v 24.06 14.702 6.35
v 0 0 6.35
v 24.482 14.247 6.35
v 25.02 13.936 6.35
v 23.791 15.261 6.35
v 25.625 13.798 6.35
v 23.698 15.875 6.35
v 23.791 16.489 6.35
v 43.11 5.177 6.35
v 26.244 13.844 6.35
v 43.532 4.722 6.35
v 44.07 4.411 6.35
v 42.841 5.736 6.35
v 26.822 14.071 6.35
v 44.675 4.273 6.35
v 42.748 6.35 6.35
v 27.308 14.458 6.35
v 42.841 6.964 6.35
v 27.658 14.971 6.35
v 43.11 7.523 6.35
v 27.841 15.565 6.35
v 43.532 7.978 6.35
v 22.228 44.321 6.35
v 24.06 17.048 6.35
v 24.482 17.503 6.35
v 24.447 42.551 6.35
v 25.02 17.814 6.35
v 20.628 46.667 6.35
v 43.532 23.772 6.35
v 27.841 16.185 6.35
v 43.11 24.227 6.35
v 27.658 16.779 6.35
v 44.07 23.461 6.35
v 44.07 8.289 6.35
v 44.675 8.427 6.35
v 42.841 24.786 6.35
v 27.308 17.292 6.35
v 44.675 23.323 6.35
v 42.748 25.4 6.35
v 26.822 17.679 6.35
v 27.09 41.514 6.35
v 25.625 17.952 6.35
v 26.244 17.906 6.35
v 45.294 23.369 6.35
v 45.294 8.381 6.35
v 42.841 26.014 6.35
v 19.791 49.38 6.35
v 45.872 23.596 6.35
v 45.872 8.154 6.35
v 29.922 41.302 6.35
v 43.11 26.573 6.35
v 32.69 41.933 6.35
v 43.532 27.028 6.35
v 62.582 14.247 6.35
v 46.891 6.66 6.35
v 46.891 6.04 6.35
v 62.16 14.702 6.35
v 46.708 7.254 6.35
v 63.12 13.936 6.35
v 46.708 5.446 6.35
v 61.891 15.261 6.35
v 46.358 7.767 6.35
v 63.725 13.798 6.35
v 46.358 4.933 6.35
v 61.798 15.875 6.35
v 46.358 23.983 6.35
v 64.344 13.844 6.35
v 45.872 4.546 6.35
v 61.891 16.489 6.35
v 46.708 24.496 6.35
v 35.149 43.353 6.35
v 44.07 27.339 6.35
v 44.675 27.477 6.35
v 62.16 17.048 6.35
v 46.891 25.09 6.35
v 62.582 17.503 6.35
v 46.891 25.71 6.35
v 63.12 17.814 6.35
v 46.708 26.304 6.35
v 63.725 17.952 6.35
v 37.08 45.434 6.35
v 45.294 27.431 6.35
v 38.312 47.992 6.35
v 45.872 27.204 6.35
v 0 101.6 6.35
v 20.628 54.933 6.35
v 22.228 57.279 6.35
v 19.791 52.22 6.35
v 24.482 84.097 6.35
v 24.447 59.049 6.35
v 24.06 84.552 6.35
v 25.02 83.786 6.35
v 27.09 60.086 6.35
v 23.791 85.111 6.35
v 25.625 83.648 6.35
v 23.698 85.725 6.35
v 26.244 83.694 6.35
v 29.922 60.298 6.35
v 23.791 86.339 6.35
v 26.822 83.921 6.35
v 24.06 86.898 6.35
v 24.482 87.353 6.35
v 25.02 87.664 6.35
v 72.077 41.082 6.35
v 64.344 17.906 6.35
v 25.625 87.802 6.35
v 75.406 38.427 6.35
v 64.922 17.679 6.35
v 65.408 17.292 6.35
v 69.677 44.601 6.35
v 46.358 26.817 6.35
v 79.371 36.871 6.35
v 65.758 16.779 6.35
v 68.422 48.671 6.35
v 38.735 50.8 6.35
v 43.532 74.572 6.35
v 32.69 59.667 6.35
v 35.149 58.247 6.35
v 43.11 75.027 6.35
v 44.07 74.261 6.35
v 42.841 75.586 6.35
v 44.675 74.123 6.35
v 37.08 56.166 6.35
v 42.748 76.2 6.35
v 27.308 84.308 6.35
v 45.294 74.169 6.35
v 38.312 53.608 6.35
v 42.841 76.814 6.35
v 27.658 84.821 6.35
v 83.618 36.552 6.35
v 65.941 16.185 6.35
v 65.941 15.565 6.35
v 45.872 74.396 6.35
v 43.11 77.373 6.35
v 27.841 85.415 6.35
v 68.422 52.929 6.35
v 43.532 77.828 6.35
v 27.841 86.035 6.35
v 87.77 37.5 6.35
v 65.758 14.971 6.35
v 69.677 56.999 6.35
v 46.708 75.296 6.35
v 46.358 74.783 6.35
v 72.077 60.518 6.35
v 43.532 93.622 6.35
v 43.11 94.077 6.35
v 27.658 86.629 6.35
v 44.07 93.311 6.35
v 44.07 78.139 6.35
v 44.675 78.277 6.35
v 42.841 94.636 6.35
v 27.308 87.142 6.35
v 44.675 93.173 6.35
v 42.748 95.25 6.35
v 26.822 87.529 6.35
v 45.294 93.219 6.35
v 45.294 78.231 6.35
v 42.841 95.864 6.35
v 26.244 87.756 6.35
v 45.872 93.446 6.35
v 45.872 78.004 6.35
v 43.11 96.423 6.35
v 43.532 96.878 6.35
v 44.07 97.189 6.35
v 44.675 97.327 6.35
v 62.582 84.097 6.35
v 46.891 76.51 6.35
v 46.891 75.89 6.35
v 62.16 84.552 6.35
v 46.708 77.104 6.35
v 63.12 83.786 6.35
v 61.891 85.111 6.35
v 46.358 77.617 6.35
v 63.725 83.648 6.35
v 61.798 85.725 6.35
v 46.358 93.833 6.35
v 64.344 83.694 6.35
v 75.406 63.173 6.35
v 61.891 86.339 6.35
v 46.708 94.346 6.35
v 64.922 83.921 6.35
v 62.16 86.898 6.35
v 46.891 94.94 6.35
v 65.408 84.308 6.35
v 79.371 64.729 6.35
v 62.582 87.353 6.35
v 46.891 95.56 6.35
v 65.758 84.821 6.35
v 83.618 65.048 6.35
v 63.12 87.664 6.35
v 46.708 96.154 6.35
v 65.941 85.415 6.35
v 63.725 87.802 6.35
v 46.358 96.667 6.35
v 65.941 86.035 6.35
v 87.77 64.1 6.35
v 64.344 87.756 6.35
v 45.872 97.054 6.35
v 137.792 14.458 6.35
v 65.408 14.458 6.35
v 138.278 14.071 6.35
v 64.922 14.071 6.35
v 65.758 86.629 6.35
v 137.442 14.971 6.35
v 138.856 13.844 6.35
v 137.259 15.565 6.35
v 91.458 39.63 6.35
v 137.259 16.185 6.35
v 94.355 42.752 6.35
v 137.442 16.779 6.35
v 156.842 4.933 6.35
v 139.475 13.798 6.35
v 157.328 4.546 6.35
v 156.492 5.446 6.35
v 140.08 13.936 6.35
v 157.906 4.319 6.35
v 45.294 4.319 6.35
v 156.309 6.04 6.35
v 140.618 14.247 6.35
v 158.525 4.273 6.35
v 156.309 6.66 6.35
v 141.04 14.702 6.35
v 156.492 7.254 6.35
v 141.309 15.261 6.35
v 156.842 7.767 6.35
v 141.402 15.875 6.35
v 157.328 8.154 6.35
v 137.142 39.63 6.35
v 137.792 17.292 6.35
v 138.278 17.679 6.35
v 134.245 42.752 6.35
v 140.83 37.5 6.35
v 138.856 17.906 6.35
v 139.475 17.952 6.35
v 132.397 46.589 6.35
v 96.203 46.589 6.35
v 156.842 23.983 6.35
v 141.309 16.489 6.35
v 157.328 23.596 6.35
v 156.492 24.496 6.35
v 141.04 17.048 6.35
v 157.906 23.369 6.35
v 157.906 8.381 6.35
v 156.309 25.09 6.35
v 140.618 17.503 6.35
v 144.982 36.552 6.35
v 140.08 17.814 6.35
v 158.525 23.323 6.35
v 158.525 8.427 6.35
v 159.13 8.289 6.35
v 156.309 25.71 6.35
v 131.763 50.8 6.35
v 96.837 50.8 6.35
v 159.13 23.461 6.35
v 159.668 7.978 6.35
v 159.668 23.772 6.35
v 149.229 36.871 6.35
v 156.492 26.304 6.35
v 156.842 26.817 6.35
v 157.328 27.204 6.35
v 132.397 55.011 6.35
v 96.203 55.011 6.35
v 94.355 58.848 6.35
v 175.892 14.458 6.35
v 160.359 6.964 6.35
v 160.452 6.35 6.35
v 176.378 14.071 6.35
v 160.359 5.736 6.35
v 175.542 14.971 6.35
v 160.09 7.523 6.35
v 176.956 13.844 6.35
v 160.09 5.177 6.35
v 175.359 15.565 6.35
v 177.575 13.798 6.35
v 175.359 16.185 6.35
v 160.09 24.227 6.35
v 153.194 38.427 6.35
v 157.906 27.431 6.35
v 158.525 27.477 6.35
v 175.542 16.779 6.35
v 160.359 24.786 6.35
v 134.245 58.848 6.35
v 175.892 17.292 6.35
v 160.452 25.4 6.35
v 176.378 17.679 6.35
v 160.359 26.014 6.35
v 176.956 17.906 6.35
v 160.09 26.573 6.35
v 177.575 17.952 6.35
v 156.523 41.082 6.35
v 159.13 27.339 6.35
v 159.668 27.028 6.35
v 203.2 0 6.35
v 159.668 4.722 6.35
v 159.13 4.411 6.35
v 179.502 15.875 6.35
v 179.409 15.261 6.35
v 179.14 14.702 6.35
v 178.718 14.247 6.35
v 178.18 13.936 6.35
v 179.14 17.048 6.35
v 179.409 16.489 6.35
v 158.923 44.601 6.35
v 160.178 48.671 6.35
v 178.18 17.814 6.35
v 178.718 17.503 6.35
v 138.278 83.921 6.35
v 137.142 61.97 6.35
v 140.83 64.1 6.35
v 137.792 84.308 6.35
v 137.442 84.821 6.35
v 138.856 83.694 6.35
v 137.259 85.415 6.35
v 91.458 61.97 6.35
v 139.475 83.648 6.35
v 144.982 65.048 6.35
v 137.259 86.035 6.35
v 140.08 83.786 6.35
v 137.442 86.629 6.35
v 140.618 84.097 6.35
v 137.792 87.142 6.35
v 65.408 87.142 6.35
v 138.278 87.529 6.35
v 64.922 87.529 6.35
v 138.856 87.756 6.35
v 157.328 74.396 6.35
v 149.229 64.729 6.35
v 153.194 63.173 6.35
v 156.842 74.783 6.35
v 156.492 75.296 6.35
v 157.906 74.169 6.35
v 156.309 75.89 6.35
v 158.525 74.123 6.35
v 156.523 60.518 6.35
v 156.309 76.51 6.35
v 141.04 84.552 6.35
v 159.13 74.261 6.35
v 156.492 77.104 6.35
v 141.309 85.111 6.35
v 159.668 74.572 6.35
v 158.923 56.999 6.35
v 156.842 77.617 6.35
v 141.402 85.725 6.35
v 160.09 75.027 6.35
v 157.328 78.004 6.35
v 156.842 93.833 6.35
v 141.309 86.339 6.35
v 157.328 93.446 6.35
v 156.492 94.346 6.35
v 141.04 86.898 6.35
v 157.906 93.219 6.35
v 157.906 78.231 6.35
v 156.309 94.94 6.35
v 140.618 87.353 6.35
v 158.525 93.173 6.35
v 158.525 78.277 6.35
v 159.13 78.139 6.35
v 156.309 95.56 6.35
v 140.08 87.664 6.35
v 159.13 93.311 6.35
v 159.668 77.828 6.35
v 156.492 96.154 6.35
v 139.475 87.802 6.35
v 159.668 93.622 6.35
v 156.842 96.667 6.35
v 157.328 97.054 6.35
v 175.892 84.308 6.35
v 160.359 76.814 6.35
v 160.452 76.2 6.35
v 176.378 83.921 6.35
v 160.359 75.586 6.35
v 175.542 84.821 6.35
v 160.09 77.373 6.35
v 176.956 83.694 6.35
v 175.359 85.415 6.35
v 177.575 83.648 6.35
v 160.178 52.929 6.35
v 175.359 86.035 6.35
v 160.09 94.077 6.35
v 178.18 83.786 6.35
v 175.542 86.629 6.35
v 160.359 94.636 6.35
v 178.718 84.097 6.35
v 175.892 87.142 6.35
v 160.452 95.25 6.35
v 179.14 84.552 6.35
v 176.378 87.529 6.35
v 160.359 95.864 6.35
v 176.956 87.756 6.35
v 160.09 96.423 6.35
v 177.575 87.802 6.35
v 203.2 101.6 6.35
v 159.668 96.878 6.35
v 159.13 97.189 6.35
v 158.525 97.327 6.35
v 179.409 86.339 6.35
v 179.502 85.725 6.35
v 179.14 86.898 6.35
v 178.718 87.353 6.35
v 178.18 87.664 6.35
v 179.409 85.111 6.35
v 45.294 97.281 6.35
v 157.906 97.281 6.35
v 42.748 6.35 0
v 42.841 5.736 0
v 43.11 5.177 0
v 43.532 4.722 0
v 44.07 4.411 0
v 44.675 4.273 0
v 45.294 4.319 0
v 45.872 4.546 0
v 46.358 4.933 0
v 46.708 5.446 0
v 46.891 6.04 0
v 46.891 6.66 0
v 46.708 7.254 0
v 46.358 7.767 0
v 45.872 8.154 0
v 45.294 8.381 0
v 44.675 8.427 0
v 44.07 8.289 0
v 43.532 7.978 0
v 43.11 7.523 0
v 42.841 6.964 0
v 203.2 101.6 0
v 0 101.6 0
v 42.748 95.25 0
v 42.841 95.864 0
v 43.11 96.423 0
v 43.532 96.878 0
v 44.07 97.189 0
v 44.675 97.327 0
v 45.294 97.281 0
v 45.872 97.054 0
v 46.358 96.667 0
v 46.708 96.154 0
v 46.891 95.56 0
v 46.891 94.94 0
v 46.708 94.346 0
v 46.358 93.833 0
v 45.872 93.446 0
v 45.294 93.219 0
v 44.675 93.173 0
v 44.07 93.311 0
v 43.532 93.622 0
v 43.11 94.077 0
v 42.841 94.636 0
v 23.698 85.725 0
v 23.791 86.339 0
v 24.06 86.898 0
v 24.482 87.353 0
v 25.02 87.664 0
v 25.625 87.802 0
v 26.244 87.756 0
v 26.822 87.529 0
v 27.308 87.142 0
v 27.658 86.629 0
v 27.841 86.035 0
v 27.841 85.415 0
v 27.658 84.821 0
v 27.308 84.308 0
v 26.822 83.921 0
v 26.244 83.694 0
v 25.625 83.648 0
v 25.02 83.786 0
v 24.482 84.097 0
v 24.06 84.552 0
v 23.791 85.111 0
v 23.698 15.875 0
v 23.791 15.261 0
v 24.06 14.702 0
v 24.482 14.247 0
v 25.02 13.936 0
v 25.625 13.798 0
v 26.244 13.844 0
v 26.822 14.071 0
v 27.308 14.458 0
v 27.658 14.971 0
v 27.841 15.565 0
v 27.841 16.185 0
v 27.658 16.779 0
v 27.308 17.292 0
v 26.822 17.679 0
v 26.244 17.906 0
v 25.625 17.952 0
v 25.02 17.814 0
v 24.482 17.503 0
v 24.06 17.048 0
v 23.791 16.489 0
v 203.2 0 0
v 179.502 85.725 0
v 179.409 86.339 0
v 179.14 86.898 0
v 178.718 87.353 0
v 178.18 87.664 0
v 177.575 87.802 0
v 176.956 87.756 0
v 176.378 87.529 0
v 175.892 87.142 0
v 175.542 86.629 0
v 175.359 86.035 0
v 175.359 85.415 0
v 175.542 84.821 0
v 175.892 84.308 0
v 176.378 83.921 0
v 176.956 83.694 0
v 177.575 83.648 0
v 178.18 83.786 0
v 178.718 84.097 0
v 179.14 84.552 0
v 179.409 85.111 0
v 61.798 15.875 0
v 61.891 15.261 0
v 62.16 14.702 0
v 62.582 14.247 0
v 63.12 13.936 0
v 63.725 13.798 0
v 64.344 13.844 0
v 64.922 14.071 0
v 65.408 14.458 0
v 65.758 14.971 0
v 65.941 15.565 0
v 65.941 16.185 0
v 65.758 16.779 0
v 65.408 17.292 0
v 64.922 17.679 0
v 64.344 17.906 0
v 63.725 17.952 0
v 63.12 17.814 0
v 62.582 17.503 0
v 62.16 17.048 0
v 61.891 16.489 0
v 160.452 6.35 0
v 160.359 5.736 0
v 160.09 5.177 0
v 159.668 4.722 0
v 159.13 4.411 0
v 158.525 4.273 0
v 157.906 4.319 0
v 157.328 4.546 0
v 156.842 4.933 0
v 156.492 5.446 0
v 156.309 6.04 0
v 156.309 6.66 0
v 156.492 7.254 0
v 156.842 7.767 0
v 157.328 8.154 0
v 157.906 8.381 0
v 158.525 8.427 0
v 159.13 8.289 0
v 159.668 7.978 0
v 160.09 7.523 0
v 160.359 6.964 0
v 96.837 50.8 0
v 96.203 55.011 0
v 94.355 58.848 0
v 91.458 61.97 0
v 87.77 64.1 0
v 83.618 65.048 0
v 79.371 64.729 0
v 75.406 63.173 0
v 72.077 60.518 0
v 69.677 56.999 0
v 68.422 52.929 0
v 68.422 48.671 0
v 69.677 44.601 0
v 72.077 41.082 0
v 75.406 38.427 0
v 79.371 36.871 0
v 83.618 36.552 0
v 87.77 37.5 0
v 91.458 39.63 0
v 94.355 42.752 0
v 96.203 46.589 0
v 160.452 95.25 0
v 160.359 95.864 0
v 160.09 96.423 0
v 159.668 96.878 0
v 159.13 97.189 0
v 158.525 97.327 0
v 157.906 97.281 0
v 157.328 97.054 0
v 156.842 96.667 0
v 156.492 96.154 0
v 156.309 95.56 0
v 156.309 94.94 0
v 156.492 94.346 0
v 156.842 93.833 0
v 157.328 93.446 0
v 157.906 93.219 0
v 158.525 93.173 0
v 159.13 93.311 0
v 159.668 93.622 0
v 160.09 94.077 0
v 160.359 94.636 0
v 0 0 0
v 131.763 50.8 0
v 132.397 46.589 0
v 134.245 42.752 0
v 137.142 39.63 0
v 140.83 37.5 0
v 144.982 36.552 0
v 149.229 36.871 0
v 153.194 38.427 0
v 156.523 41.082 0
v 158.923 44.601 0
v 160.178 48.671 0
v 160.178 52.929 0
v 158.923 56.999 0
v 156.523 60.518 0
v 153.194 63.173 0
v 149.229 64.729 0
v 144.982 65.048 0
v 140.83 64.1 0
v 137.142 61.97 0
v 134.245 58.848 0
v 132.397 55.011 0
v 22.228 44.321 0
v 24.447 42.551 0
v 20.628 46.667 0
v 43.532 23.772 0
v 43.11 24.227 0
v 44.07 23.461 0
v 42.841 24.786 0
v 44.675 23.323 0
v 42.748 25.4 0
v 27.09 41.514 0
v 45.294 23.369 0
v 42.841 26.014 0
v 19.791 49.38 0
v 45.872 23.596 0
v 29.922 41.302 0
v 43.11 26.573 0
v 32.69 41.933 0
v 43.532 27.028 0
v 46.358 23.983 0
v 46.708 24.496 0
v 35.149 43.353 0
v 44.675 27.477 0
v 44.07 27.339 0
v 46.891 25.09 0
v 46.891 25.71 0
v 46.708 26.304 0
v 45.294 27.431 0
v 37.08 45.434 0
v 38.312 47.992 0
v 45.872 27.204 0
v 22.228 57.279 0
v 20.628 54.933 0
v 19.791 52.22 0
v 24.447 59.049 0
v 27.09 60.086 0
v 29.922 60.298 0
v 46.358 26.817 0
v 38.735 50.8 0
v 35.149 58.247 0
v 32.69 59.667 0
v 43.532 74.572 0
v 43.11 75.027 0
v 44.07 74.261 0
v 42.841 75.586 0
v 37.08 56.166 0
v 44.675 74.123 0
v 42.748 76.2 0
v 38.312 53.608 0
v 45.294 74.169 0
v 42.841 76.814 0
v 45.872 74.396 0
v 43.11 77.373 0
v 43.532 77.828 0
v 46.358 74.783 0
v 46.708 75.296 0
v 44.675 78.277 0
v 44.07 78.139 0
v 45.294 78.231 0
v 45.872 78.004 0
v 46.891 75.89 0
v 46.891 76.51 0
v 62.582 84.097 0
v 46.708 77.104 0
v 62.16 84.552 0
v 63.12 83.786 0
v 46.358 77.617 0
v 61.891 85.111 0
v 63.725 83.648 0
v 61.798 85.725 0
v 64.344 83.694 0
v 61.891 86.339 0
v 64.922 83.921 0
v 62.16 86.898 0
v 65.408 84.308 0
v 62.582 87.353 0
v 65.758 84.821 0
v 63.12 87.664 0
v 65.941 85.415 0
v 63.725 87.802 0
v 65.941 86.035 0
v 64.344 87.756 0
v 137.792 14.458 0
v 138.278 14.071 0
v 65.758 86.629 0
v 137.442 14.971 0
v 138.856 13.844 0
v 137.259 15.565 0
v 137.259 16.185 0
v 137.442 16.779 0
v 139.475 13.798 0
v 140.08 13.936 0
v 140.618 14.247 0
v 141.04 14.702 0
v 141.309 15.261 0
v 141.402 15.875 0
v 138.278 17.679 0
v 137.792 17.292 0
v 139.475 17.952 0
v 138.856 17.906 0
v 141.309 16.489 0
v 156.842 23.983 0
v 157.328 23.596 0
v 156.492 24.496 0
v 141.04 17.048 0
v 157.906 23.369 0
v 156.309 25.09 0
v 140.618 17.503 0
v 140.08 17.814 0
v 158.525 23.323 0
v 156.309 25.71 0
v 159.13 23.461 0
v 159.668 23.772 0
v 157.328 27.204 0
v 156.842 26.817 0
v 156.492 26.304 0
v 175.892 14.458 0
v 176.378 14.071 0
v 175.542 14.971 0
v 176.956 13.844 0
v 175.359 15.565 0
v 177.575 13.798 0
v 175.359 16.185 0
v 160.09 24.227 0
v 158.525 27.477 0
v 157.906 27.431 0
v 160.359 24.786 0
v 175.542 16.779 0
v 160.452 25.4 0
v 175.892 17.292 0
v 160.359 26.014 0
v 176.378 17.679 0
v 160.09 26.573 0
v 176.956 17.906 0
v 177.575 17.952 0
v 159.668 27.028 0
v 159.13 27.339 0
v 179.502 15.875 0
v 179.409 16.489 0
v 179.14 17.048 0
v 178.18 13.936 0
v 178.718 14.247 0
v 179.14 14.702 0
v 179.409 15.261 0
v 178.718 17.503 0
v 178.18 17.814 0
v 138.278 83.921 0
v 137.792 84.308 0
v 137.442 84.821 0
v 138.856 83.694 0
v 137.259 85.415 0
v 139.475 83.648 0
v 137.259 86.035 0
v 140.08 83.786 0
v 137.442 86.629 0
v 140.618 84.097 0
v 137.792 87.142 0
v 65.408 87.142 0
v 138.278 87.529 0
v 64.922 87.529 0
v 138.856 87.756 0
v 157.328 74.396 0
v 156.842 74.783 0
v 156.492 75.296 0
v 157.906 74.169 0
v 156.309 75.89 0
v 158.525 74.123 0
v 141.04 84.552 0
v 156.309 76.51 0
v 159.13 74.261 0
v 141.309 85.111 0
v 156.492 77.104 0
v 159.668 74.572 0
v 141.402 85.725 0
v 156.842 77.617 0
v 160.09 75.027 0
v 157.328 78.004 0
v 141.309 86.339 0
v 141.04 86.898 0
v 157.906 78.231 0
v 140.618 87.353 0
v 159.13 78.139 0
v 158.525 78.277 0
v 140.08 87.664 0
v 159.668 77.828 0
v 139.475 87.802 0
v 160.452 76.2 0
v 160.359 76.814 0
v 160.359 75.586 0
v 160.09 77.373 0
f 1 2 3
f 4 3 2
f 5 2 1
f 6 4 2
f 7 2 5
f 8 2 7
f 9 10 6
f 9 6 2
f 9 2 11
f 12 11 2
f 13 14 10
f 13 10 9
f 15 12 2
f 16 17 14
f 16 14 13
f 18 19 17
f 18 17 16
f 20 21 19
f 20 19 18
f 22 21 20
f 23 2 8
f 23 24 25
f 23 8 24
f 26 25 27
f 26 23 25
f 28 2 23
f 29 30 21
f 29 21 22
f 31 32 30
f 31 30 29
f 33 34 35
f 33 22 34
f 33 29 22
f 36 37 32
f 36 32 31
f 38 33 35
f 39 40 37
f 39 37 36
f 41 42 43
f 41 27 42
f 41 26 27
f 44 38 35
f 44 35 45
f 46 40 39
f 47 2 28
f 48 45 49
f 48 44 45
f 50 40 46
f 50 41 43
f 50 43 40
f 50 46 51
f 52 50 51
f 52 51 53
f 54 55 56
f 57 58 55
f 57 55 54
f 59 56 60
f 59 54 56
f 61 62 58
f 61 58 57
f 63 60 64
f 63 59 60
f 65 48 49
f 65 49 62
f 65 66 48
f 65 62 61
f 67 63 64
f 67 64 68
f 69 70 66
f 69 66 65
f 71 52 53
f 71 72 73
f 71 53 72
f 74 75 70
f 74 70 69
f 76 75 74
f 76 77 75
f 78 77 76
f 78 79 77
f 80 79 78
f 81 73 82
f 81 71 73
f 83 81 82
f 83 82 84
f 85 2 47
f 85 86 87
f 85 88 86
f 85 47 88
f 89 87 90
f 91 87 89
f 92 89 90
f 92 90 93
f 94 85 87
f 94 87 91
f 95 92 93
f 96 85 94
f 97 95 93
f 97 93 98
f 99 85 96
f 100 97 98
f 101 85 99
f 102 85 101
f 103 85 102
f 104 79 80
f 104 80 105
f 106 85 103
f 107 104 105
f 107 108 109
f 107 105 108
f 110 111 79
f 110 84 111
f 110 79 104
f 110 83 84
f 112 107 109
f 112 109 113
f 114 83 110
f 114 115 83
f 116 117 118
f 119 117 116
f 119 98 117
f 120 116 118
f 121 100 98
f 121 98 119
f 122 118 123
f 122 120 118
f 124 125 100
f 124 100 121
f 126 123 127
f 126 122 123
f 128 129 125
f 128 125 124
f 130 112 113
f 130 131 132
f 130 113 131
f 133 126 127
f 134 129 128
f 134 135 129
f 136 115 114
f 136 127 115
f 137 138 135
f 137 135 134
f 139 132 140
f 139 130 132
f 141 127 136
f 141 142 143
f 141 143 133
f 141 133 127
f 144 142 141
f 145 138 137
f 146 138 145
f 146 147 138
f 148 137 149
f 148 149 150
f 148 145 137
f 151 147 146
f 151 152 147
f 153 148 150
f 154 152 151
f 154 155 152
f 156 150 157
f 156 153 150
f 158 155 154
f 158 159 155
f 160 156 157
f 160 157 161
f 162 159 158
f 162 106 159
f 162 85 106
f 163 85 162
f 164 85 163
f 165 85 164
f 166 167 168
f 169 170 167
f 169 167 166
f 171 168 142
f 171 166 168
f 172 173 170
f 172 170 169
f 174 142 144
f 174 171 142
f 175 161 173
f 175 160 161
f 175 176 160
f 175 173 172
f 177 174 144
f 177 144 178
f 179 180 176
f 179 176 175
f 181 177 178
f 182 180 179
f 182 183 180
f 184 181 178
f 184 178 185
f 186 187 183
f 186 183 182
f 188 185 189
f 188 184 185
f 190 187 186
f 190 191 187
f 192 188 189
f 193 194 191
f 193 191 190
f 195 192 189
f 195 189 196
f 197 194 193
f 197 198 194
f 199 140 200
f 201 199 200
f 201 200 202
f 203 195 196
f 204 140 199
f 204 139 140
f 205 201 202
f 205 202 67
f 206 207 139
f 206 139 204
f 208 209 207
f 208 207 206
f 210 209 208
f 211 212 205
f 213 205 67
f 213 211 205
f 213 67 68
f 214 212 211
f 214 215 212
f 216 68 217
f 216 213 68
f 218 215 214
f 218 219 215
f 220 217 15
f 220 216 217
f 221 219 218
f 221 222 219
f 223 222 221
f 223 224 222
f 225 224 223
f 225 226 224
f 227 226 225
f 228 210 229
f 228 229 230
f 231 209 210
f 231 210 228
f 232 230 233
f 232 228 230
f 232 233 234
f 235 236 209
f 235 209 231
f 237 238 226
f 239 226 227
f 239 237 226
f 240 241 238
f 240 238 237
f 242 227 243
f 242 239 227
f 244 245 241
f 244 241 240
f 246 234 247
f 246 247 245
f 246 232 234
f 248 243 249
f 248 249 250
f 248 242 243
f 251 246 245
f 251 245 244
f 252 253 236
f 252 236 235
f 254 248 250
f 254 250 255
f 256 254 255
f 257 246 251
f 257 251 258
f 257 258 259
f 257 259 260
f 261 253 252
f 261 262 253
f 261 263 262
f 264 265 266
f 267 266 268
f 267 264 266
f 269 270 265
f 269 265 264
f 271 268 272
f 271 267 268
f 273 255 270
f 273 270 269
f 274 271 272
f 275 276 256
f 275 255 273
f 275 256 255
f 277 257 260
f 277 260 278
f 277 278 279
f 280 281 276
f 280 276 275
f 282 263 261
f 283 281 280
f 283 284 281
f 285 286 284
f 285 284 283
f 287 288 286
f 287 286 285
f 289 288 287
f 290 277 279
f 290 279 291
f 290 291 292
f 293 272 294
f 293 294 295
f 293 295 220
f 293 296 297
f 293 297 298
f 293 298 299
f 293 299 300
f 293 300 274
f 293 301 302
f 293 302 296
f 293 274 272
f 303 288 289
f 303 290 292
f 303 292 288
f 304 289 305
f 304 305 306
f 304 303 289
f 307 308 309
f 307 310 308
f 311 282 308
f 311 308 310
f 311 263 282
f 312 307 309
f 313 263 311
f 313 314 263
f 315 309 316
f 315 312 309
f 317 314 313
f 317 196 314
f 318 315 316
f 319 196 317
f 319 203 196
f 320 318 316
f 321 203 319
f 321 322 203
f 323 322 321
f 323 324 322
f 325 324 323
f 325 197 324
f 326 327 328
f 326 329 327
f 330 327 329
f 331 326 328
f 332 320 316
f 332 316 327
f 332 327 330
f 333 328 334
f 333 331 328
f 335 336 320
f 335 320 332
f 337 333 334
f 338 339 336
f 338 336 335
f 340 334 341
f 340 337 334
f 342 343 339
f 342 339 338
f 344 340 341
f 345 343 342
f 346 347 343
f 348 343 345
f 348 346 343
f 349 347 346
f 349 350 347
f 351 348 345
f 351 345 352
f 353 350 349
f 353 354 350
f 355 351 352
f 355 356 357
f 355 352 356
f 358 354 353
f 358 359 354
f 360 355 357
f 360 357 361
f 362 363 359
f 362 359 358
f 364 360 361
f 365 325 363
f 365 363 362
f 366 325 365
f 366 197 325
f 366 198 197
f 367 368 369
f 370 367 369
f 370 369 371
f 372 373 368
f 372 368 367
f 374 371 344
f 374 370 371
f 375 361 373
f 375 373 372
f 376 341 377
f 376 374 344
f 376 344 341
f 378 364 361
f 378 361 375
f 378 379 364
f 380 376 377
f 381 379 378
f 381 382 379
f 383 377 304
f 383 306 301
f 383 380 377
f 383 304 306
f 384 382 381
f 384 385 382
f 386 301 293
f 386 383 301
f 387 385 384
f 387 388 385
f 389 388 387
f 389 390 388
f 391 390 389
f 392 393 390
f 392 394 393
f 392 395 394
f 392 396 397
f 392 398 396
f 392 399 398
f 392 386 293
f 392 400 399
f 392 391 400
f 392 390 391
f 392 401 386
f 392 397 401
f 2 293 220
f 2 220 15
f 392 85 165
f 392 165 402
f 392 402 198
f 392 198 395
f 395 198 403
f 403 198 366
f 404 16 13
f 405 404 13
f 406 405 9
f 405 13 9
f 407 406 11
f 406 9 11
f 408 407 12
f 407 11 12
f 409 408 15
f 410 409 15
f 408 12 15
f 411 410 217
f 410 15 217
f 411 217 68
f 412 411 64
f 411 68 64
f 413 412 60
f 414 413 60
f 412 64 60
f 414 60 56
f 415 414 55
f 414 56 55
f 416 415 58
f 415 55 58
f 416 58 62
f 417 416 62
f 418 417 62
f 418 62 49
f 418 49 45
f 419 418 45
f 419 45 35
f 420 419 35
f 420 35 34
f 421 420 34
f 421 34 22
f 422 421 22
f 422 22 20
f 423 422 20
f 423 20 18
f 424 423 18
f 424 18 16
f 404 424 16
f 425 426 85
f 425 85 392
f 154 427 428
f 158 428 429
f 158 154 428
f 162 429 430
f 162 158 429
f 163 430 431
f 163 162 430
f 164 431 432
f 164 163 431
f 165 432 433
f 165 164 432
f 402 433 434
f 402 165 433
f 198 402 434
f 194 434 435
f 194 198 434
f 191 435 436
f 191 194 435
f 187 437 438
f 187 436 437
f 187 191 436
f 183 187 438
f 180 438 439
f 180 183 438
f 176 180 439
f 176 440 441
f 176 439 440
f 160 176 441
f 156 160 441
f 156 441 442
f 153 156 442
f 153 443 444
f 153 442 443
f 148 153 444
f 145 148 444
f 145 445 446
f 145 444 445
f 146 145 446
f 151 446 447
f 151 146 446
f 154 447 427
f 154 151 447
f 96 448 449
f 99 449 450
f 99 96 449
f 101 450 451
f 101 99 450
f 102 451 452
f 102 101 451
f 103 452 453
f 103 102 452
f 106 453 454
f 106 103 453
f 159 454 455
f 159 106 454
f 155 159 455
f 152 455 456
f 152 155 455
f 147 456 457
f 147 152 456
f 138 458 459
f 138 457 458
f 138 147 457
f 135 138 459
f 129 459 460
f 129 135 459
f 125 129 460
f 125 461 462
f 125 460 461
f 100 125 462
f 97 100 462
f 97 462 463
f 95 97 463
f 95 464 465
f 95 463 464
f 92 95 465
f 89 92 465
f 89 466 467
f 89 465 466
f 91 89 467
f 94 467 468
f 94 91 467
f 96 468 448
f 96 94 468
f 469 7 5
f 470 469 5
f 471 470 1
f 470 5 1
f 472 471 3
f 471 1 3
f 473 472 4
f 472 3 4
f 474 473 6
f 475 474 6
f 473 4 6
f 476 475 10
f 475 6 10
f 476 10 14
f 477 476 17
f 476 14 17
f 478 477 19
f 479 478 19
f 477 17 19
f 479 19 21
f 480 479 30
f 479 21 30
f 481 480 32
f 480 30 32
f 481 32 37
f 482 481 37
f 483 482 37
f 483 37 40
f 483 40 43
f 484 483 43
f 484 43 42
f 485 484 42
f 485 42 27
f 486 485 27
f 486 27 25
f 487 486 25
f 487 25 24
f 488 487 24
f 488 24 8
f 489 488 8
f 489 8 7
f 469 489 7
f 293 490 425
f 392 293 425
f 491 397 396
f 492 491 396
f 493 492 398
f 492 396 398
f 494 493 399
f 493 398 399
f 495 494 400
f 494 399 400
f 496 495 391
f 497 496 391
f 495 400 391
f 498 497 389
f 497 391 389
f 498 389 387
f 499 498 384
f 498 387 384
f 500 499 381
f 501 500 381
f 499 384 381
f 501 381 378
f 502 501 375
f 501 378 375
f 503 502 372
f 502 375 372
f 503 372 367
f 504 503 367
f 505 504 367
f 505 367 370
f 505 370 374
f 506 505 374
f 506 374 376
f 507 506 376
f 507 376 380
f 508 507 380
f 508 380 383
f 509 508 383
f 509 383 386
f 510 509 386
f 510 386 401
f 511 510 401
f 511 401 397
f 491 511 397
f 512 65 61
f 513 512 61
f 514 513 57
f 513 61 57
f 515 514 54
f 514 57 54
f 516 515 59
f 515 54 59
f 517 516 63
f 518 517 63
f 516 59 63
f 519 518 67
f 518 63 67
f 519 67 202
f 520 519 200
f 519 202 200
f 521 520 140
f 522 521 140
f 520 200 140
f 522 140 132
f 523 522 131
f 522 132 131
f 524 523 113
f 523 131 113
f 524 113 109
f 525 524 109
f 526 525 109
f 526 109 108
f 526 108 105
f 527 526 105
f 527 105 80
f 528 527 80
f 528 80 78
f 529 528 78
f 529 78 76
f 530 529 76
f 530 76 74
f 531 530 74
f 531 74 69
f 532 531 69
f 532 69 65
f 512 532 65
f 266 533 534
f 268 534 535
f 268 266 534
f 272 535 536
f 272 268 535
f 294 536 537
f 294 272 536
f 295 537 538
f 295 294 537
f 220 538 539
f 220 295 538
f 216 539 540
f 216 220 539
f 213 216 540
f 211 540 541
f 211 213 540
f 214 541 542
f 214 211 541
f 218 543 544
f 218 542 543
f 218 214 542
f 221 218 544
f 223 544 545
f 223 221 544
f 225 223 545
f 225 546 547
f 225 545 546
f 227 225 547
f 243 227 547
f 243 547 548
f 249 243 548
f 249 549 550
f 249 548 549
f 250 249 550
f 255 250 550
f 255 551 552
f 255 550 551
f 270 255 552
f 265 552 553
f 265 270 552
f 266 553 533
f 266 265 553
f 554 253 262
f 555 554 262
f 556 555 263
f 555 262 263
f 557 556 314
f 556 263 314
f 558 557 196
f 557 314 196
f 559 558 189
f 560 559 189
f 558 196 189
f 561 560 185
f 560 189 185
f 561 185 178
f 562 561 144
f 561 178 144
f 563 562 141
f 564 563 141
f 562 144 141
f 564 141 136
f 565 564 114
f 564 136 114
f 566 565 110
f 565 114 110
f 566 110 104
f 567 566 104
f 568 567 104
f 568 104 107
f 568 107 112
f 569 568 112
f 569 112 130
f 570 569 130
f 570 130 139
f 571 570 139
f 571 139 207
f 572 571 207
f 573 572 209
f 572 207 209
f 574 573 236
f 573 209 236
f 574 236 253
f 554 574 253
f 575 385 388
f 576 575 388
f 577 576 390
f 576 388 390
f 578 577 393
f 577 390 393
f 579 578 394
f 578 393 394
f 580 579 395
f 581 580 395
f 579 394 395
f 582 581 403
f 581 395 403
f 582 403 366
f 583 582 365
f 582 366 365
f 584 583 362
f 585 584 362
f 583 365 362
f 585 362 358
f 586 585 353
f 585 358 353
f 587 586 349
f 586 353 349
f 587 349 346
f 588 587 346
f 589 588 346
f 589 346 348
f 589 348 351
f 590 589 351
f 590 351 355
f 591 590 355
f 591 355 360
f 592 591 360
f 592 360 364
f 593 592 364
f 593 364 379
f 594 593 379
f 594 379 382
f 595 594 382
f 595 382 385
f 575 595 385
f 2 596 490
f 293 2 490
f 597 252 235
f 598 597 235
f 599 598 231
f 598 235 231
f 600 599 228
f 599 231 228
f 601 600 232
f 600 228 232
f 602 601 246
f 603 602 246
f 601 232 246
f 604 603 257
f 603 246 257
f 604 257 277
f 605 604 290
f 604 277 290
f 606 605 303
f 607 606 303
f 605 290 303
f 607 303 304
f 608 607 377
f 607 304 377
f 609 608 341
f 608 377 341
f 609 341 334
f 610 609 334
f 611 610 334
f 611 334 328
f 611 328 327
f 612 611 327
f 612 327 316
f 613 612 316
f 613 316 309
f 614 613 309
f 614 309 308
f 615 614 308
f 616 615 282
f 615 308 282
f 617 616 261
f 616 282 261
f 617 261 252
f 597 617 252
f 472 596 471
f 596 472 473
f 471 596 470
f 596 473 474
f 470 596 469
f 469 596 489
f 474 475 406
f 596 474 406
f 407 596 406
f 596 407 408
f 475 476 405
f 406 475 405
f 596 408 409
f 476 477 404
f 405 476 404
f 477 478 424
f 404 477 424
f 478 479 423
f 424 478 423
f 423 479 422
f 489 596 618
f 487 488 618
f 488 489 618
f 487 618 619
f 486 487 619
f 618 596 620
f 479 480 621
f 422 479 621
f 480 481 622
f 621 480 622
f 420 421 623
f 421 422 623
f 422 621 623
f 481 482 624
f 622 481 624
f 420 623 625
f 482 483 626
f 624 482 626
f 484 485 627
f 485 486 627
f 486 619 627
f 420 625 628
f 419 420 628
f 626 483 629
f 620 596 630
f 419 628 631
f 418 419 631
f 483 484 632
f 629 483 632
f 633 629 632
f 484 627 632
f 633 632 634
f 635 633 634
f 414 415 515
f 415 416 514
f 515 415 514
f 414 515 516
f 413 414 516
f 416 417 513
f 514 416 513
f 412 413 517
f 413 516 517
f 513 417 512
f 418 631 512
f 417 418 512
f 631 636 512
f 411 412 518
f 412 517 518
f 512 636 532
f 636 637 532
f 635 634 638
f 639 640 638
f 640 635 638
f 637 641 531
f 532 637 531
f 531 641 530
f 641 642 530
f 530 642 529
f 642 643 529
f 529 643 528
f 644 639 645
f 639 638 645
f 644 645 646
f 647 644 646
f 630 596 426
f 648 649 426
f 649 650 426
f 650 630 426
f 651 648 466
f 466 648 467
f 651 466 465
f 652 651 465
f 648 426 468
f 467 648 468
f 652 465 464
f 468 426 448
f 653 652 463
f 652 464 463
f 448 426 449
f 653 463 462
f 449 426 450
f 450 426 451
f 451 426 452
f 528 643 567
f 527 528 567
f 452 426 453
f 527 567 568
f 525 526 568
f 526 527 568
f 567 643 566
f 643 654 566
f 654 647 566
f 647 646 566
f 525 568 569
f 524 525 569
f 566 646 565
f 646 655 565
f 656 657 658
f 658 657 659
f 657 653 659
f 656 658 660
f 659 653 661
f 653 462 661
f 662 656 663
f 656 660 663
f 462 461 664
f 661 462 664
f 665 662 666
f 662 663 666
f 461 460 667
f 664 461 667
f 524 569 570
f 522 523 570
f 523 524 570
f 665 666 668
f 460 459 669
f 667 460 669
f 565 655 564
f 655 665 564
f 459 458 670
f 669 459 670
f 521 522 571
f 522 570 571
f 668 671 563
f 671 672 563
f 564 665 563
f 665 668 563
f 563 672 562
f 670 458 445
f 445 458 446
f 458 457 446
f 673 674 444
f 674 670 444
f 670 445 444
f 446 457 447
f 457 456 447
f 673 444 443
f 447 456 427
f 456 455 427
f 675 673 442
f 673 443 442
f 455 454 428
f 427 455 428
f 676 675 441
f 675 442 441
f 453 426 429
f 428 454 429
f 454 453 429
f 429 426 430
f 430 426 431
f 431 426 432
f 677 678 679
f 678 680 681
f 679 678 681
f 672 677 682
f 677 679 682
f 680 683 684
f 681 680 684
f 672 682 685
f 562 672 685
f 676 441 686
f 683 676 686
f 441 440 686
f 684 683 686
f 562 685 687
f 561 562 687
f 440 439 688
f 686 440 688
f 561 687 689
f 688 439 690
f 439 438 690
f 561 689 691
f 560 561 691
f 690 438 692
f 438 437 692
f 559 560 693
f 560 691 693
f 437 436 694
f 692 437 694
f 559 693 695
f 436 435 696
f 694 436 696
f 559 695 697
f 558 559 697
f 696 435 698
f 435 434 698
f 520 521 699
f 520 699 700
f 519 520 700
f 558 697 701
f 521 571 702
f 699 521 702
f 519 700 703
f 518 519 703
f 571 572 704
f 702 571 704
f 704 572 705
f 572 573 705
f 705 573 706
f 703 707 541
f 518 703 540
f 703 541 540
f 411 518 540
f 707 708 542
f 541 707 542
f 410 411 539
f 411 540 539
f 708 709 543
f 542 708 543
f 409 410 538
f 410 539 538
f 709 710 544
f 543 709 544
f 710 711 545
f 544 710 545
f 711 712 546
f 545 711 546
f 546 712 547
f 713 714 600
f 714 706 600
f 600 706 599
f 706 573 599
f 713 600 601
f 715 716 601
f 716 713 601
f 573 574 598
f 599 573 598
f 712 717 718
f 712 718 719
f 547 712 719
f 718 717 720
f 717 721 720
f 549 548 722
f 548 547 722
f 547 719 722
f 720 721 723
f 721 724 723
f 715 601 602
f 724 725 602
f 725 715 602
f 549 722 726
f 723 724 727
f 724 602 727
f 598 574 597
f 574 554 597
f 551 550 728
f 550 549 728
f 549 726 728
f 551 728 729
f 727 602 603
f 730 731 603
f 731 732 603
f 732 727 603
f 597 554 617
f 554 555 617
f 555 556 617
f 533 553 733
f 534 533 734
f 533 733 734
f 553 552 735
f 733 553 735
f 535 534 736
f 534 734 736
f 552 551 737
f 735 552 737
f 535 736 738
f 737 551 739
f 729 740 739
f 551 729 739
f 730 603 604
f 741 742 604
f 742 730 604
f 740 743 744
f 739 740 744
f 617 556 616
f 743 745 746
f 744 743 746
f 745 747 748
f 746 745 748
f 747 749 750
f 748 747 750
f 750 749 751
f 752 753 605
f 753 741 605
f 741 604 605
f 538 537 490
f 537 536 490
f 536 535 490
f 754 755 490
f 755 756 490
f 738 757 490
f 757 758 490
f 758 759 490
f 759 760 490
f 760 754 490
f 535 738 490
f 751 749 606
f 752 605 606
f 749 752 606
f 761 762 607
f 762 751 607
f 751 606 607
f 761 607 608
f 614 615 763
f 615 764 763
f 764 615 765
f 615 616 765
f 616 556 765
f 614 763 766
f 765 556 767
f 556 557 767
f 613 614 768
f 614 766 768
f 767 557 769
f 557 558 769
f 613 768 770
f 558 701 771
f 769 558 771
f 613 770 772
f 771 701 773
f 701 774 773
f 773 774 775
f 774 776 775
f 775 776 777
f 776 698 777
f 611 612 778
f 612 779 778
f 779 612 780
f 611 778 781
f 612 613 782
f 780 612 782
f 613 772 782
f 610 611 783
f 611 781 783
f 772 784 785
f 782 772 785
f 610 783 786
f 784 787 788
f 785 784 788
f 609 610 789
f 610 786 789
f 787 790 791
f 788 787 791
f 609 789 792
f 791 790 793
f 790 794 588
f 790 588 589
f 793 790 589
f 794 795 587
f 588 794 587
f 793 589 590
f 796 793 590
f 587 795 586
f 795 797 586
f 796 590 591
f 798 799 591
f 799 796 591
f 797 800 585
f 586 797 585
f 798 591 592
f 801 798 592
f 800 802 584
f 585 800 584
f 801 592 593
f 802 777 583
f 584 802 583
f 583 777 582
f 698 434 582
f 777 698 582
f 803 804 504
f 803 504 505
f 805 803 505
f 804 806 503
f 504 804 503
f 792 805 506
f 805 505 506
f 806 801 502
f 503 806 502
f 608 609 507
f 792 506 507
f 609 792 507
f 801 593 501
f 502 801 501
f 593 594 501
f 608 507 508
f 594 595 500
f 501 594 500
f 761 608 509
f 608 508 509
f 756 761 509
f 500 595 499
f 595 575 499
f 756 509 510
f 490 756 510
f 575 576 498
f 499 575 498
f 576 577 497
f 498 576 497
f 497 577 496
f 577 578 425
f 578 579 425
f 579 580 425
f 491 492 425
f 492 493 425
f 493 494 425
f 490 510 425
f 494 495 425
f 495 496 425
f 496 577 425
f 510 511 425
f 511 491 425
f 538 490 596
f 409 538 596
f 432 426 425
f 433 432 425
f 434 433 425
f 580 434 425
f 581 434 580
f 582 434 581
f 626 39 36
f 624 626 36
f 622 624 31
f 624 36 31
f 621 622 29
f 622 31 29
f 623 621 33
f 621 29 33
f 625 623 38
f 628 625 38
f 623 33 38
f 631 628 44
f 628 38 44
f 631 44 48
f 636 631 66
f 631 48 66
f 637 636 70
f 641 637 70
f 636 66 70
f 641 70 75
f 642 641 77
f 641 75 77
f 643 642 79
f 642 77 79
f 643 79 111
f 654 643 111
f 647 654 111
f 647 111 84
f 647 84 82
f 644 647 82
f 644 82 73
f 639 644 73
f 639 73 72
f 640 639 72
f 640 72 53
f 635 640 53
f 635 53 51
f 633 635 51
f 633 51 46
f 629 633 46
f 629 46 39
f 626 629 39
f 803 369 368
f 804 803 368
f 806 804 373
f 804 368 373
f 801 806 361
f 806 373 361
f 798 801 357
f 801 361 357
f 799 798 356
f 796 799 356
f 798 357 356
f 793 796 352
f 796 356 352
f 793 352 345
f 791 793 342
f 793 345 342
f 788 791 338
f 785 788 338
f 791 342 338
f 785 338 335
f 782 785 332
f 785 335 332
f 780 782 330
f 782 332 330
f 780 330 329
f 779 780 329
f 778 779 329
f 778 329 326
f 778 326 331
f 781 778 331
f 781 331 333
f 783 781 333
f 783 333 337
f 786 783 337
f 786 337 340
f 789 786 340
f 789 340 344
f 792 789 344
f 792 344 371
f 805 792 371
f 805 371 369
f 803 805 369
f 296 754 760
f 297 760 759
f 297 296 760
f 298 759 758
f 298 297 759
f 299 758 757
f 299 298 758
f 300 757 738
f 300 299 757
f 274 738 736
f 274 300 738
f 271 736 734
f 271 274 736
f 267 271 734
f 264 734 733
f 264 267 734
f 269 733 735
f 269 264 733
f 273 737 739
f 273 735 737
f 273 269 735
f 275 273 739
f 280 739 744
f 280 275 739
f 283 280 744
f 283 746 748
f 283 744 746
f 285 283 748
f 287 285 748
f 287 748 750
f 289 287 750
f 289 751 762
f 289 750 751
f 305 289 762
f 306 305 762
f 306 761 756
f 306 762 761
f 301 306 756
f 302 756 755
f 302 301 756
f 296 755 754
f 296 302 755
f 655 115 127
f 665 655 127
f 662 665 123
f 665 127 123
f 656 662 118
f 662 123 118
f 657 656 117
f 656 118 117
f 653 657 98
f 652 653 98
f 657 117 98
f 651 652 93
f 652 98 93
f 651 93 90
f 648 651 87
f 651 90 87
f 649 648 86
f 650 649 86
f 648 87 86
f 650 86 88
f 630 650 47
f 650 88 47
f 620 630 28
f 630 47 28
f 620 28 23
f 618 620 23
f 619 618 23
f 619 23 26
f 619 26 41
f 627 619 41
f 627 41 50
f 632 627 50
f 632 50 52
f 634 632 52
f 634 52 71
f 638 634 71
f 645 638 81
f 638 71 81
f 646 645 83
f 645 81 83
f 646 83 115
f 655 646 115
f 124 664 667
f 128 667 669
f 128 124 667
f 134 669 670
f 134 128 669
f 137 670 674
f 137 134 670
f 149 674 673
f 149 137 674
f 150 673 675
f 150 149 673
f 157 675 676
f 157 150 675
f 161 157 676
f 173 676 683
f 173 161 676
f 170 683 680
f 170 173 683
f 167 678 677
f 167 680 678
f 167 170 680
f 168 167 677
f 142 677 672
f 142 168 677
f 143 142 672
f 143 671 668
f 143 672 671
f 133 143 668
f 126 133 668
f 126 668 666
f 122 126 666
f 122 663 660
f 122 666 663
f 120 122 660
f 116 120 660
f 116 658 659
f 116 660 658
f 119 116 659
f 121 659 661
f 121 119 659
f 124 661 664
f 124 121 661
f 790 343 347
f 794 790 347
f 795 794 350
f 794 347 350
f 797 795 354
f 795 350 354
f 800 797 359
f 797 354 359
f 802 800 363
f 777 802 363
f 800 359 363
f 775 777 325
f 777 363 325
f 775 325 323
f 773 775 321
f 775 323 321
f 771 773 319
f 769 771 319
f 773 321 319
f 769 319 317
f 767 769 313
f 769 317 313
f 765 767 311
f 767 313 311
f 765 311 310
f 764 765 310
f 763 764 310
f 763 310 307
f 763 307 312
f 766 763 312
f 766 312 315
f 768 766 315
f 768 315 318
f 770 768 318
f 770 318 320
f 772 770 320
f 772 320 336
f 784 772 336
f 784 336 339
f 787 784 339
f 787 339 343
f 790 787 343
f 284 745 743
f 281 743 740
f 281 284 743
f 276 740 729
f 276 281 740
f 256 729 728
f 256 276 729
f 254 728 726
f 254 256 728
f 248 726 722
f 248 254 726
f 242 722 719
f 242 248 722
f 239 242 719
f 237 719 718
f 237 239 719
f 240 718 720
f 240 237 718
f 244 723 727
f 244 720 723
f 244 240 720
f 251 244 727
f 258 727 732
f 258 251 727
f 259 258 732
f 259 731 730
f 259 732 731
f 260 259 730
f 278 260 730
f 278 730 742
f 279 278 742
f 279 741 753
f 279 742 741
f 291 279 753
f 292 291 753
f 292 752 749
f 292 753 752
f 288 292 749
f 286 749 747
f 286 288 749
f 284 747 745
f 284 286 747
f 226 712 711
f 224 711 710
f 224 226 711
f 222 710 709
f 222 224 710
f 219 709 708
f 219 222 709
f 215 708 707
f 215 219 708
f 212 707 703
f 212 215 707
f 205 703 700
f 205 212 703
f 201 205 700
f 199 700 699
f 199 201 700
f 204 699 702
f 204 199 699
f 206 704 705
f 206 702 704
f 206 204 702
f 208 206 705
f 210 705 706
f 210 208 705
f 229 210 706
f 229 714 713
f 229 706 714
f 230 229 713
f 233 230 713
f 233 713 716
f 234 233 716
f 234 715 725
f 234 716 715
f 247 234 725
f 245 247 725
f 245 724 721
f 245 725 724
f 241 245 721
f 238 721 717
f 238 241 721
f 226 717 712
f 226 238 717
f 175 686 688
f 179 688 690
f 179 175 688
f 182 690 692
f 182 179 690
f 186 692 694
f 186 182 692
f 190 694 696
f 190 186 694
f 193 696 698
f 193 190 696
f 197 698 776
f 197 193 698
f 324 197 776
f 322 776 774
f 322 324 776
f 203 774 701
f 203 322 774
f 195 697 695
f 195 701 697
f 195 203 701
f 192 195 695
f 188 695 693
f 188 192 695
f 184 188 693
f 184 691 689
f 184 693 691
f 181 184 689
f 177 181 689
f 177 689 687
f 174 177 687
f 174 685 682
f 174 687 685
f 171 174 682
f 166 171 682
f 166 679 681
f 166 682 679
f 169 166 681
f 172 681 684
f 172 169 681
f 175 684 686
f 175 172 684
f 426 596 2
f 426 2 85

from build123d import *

# Parameters (mm, degrees)
SKETCH1_W               = 203.2
SKETCH1_H               = 101.6
BOSS_EXTRUDE1_DEPTH     = 6.35
SKETCH3_R               = 14.2875
SKETCH3_R_2             = 9.525
CUT_EXTRUDE2_DEPTH      = 6.35
SKETCH5_R               = 2.0828
CUT_EXTRUDE3_DEPTH      = 228.273233136
MIRROR2_COPY_1_SKETCH_R = 2.0828
MIRROR2_COPY_1_DEPTH    = 228.273233136


with BuildPart() as part:
    # Sketch1 → Boss-Extrude1 (new body)
    with BuildSketch(Plane.XY):
        with Locations((101.6, 50.8)):
            Rectangle(SKETCH1_W, SKETCH1_H)
    extrude(amount=BOSS_EXTRUDE1_DEPTH)

    # Sketch3 → Cut-Extrude2 (cut)
    with BuildSketch(Plane.XY.offset(6.35)):
        with Locations((82.55, 50.8)):
            Circle(SKETCH3_R)
        with Locations(Location((146.05, 50.8, 0), (0, 0, 180))):
            Circle(SKETCH3_R)
        with Locations((29.21, 50.8)):
            Circle(SKETCH3_R_2)
    extrude(amount=-CUT_EXTRUDE2_DEPTH, mode=Mode.SUBTRACT)

    # Sketch5 → Cut-Extrude3 (cut, through all)
    with BuildSketch(Plane.XY.offset(6.35)):
        with Locations((139.319, 85.725)):
            Circle(SKETCH5_R)
        with Locations((158.369, 95.25)):
            Circle(SKETCH5_R)
        with Locations((158.369, 76.2)):
            Circle(SKETCH5_R)
        with Locations((177.419, 85.725)):
            Circle(SKETCH5_R)
    cut_extrude3 = extrude(amount=-CUT_EXTRUDE3_DEPTH, mode=Mode.SUBTRACT)

    # Mirror1: Cut-Extrude3 across plane
    add(cut_extrude3.mirror(Plane.ZX.offset(50.8)), mode=Mode.SUBTRACT)

    # Mirror2: Cut-Extrude3 across plane
    add(cut_extrude3.mirror(Plane(origin=(101.6, 0, 0), x_dir=(0, 0, 1), z_dir=(1, 0, 0))), mode=Mode.SUBTRACT)

    # Mirror2 copy 1 sketch → Mirror2 copy 1 (cut, through all)
    with BuildSketch(Plane(origin=(203.2, 101.6, 6.35), x_dir=(-1, 0, 0), z_dir=(0, 0, 1))):
        with Locations((139.319, 85.725)):
            Circle(MIRROR2_COPY_1_SKETCH_R)
        with Locations((158.369, 95.25)):
            Circle(MIRROR2_COPY_1_SKETCH_R)
        with Locations((158.369, 76.2)):
            Circle(MIRROR2_COPY_1_SKETCH_R)
        with Locations((177.419, 85.725)):
            Circle(MIRROR2_COPY_1_SKETCH_R)
    extrude(amount=-MIRROR2_COPY_1_DEPTH, mode=Mode.SUBTRACT)


solid = part.part
